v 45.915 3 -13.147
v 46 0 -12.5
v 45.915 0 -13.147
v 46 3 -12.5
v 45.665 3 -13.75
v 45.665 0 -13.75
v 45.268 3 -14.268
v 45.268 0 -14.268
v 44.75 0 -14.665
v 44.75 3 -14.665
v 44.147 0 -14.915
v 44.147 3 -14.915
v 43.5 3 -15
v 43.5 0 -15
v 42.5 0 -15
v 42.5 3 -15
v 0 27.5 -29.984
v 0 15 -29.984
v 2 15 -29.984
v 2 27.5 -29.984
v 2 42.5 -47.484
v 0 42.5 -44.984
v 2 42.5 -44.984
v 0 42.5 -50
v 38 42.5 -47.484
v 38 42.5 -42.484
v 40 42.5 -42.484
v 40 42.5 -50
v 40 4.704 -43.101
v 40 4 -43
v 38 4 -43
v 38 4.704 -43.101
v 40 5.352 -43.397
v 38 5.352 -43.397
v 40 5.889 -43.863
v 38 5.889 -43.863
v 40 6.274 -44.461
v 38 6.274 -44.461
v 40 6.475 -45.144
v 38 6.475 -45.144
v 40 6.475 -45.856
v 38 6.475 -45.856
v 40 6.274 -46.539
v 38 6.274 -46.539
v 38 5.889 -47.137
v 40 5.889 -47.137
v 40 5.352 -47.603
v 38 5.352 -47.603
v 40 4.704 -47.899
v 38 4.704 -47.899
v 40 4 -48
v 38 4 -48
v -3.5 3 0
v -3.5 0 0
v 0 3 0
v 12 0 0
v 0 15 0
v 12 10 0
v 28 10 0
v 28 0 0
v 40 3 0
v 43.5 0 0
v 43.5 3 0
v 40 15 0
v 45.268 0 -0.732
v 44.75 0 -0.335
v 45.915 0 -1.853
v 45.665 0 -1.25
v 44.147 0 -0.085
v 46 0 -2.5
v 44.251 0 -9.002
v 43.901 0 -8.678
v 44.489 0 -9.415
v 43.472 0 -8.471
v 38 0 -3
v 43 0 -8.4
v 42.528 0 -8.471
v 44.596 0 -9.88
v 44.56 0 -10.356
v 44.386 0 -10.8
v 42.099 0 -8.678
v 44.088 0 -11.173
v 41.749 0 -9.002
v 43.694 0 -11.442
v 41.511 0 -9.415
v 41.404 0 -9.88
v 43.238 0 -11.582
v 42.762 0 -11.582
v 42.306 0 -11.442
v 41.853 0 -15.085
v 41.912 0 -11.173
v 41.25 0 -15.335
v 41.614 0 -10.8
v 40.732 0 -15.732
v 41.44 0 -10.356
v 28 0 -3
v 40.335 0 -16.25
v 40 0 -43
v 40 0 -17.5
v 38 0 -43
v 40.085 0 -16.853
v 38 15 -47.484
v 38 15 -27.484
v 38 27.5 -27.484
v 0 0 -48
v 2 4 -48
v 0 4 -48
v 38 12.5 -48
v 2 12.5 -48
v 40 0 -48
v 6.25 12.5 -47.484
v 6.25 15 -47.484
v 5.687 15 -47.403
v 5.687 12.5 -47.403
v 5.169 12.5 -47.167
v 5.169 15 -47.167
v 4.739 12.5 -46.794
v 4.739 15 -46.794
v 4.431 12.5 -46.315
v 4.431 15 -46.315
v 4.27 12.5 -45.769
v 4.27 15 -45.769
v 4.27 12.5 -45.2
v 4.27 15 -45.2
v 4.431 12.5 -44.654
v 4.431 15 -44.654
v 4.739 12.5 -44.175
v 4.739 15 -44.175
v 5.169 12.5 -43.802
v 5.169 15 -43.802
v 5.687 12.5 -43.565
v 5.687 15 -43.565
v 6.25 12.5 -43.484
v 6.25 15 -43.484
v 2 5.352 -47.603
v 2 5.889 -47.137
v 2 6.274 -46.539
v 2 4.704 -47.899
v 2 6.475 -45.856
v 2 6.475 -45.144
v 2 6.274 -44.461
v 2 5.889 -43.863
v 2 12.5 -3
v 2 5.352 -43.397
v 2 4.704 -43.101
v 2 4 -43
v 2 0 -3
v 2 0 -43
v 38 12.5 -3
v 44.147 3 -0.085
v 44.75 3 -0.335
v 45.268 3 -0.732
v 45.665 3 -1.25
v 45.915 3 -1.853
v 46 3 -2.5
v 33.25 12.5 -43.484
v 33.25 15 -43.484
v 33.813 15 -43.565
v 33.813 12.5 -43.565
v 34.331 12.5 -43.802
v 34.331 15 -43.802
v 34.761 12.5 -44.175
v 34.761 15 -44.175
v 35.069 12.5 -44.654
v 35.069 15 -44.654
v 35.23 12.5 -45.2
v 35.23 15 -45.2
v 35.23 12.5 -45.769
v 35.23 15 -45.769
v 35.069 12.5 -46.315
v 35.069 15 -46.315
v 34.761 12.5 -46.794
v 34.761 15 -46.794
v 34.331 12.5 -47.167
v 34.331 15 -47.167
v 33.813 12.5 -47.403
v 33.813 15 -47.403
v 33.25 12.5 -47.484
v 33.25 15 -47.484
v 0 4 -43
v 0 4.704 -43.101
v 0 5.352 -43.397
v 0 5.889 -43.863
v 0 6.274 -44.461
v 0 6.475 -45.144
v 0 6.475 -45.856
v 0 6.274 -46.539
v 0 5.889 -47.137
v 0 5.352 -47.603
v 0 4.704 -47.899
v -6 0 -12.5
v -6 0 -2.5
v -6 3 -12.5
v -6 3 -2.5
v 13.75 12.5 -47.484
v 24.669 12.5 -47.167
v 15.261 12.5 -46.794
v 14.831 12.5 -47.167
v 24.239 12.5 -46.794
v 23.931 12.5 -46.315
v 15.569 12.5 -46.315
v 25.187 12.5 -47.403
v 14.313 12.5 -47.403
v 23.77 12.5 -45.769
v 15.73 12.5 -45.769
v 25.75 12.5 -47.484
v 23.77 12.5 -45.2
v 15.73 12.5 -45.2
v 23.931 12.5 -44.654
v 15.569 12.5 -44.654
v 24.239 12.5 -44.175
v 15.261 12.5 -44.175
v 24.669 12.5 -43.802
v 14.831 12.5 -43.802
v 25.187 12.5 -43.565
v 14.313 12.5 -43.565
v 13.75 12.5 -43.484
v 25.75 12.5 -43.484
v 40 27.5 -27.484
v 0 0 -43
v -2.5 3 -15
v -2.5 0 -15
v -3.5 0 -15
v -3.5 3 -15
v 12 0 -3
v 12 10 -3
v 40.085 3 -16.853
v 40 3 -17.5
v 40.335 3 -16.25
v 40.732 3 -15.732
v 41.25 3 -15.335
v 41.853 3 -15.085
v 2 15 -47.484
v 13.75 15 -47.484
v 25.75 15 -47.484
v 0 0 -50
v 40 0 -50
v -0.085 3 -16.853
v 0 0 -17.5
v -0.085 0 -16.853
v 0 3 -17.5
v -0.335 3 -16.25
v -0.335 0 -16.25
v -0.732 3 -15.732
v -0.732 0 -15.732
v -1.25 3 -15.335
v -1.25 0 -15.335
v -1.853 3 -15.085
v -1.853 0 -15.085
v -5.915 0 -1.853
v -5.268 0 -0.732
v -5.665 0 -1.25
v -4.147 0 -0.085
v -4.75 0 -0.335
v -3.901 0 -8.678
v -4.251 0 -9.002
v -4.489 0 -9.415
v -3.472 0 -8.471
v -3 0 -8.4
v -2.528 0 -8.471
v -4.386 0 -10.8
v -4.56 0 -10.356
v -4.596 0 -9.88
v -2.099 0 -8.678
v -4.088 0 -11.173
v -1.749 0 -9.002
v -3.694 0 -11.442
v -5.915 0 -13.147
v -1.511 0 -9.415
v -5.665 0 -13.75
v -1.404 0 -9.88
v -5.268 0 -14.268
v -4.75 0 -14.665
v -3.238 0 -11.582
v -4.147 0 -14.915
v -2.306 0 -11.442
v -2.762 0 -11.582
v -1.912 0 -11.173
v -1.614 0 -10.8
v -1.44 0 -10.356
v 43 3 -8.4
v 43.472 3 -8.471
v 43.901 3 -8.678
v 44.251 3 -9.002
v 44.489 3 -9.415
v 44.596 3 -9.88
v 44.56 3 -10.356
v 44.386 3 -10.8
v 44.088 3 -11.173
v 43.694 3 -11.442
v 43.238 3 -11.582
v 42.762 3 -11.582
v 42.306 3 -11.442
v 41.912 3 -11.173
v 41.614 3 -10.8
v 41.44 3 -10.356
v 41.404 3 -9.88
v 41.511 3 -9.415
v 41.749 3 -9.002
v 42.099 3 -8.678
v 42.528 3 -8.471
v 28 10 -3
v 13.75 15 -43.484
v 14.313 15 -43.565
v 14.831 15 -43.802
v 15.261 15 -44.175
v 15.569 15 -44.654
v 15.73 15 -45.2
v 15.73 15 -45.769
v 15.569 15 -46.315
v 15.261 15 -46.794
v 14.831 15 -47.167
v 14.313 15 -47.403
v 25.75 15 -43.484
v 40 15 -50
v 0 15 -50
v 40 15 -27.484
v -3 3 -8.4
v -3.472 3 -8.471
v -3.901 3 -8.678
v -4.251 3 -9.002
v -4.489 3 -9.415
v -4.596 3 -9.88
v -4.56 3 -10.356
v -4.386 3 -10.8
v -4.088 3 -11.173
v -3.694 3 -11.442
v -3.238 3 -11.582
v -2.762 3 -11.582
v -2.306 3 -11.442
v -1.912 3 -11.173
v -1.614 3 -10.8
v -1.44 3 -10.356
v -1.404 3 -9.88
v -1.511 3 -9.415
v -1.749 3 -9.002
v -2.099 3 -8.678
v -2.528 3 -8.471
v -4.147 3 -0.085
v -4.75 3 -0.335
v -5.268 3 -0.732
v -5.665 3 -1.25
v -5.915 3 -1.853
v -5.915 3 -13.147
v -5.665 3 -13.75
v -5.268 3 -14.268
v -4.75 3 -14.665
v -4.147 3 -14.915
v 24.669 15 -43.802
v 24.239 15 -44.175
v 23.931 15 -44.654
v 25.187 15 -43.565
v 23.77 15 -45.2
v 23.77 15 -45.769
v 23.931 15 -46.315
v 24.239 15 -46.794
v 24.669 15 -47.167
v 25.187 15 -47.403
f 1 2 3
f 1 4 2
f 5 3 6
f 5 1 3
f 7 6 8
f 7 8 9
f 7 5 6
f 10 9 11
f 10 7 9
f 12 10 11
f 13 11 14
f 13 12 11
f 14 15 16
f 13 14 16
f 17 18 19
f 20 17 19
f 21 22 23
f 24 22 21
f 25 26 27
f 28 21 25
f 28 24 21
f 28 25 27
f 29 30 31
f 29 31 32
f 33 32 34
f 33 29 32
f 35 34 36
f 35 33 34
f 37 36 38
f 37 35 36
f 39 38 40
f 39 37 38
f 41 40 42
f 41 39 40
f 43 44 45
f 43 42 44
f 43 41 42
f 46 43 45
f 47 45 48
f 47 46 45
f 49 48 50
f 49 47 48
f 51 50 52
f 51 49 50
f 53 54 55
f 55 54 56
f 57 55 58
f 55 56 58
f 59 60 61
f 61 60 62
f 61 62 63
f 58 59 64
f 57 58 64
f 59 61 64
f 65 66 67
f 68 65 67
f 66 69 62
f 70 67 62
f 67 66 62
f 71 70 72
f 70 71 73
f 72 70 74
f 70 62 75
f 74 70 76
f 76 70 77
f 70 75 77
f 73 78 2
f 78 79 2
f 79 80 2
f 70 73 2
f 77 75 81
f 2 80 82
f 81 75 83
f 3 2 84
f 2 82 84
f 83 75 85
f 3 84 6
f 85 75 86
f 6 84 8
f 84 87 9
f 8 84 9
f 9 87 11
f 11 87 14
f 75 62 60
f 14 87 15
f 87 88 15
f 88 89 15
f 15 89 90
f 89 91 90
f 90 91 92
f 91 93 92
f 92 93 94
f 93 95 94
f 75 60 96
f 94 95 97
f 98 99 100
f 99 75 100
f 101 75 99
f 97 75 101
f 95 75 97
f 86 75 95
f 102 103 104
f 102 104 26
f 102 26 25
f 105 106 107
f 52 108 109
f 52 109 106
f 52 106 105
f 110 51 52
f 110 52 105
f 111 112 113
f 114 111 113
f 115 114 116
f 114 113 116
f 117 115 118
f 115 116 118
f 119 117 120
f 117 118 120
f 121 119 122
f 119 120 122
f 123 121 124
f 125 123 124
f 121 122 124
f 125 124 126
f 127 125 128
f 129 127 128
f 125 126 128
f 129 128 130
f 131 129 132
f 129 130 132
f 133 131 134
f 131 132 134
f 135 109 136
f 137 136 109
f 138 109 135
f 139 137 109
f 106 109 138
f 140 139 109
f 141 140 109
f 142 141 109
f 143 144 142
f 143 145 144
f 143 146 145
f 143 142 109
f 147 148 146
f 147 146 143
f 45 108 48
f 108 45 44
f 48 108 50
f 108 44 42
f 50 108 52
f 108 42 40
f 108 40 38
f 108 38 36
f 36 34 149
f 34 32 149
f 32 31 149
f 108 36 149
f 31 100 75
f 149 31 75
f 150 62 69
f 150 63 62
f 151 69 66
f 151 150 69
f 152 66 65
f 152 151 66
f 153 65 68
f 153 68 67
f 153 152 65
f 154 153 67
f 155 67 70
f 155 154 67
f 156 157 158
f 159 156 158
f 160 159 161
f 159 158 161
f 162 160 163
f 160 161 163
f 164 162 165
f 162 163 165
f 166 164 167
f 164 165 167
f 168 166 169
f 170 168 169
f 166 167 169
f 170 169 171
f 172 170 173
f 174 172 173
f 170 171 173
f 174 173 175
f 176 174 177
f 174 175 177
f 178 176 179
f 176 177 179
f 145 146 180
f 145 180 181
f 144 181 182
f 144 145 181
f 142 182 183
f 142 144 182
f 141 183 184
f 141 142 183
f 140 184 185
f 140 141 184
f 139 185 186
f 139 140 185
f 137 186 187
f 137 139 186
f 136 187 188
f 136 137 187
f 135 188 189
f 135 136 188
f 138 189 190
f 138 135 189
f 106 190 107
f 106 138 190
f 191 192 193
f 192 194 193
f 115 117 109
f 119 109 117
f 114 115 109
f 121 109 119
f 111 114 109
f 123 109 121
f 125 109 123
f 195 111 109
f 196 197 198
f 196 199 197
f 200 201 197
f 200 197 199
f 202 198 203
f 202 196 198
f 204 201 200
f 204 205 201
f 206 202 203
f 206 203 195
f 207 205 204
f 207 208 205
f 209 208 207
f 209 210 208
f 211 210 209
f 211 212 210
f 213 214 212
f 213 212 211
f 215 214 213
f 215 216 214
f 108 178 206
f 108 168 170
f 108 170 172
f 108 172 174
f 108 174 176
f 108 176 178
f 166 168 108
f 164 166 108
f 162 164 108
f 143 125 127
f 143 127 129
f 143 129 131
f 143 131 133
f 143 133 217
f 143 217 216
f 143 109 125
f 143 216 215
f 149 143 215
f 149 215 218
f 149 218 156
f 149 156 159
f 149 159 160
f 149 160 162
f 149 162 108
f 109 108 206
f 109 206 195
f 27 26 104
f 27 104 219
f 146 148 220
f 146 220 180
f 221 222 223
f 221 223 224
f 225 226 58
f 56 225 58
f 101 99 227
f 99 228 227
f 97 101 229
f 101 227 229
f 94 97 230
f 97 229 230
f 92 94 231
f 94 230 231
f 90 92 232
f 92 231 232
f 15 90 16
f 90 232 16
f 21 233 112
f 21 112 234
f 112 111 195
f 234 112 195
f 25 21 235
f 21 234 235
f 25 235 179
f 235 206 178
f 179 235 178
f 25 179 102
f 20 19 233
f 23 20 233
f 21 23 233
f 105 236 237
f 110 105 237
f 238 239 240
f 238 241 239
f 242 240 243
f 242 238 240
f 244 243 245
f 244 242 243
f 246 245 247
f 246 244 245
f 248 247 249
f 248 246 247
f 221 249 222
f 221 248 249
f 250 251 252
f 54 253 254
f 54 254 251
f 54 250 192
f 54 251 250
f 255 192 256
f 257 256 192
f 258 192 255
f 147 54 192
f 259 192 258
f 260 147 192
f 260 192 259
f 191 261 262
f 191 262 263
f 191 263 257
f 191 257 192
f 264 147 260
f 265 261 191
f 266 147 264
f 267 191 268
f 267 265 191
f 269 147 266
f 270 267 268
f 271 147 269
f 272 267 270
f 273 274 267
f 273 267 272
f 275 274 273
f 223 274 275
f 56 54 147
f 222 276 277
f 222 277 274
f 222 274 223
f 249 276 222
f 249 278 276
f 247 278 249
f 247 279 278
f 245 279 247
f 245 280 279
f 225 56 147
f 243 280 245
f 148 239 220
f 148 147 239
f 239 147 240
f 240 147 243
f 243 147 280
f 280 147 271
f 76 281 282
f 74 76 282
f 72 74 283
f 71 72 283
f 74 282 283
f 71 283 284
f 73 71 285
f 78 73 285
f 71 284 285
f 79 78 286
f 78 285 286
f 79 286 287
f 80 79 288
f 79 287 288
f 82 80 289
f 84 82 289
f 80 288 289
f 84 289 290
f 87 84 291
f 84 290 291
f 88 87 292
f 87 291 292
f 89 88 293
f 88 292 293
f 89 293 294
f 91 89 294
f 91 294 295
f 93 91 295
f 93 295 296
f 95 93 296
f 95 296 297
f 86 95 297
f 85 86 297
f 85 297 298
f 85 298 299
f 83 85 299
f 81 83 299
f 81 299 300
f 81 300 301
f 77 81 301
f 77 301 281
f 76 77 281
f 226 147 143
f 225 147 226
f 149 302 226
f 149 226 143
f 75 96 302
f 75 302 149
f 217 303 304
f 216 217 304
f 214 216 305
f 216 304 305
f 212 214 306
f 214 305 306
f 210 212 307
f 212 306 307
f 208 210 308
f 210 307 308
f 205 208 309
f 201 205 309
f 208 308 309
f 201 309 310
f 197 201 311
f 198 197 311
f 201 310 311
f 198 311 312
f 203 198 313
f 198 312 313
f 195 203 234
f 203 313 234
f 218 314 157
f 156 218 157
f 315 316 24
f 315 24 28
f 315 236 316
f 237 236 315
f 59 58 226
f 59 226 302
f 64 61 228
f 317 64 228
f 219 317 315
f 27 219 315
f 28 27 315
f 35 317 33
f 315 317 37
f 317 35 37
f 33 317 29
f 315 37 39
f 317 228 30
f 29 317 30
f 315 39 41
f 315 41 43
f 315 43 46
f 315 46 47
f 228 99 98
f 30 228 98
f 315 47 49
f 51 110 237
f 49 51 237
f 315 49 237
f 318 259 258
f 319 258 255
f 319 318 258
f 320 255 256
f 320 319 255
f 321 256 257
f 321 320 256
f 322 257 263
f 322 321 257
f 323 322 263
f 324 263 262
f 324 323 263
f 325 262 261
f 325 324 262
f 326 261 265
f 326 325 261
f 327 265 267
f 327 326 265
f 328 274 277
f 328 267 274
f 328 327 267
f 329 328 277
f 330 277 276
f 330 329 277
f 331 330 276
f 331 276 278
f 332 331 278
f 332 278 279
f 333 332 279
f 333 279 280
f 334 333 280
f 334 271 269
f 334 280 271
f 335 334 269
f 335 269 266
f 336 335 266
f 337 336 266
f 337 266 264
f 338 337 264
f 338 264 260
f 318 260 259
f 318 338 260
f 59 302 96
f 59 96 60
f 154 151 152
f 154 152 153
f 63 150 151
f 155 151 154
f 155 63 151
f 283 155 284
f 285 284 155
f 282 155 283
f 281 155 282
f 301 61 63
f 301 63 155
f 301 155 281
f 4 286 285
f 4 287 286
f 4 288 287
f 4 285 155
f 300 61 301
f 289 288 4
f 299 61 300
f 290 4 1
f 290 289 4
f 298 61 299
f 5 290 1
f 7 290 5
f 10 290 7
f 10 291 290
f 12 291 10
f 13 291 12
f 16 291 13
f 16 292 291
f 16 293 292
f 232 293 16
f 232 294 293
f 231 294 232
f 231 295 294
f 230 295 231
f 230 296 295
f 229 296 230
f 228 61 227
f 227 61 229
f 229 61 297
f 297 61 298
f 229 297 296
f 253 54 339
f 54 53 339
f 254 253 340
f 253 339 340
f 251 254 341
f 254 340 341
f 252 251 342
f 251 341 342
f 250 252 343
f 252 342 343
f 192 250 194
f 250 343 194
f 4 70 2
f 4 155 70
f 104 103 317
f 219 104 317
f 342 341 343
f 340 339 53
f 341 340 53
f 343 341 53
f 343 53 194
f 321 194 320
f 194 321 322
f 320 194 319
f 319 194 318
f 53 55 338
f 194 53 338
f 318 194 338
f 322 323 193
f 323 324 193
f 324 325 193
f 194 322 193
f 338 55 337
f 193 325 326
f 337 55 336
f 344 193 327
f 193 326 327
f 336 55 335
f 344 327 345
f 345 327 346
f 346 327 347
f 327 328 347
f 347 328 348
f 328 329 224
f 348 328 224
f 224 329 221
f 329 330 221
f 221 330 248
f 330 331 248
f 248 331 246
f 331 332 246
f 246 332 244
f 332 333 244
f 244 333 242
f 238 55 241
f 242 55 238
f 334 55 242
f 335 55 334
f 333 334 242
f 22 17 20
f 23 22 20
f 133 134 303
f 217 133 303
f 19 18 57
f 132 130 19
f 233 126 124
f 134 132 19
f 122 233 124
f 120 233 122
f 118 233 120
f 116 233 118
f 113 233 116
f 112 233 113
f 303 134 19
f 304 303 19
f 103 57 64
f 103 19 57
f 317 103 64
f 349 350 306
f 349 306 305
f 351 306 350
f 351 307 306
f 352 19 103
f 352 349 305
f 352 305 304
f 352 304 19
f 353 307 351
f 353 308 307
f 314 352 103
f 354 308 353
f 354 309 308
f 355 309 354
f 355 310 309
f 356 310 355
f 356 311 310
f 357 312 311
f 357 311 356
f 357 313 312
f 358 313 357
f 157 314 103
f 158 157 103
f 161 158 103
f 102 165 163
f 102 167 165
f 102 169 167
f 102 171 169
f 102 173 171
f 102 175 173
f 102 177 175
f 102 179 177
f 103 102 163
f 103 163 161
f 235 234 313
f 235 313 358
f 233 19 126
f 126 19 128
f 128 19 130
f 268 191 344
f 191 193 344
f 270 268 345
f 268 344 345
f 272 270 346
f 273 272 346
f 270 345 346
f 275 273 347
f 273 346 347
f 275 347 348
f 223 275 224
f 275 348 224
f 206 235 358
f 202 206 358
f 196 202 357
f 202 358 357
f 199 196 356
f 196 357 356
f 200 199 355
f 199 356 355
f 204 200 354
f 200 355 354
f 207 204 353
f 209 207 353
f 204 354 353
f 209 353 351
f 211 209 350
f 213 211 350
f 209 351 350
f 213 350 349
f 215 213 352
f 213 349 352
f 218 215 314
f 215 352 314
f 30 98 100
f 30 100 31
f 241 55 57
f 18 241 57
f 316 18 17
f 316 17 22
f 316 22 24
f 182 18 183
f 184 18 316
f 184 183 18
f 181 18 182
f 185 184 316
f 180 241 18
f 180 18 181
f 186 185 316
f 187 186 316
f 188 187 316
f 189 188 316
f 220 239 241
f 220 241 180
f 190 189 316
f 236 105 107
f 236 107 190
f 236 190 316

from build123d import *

# Parameters (mm, degrees)
SKETCH1_W               = 40
SKETCH1_H               = 50
BOSS_EXTRUDE1_DEPTH     = 15
SKETCH2_W               = 16
SKETCH2_H               = 3
CUT_EXTRUDE1_DEPTH      = 10
SKETCH3_W               = 36
SKETCH3_H               = 45
CUT_EXTRUDE2_DEPTH      = 12.5
SKETCH4_W               = 40
SKETCH4_H               = 2.515653855
BOSS_EXTRUDE2_DEPTH     = 27.5
CUT_EXTRUDE3_DEPTH      = 70.686799324
SKETCH6_W               = 2
SKETCH6_H               = 17.5
SKETCH6_H_2             = 20
BOSS_EXTRUDE3_DEPTH     = 27.5
CUT_EXTRUDE5_DEPTH      = 77.852130745
CUT_EXTRUDE5_DEPTH_BACK = 77.852130745
SKETCH8_W               = 15
SKETCH8_H               = 3
BOSS_EXTRUDE4_DEPTH     = 6
SKETCH9_R               = 1.6
CUT_EXTRUDE6_DEPTH      = 79.589121385
FILLET1_R               = 2.5
CHAMFER3_SIZE           = 15


with BuildPart() as part:
    # Sketch1 → Boss-Extrude1 (new body)
    with BuildSketch(Plane(origin=(0, 0, 0), x_dir=(1, 0, 0), z_dir=(0, 1, 0))):
        with Locations((20, 25)):
            Rectangle(SKETCH1_W, SKETCH1_H)
    extrude(amount=BOSS_EXTRUDE1_DEPTH)

    # Sketch2 → Cut-Extrude1 (cut)
    with BuildSketch(Plane.XZ):
        with Locations((20, -1.5)):
            Rectangle(SKETCH2_W, SKETCH2_H)
    extrude(amount=-CUT_EXTRUDE1_DEPTH, mode=Mode.SUBTRACT)

    # Sketch3 → Cut-Extrude2 (cut)
    with BuildSketch(Plane.XZ):
        with Locations((20, -25.5)):
            Rectangle(SKETCH3_W, SKETCH3_H)
    extrude(amount=-CUT_EXTRUDE2_DEPTH, mode=Mode.SUBTRACT)

    # Sketch4 → Boss-Extrude2 (add)
    with BuildSketch(Plane(origin=(0, 15, 0), x_dir=(1, 0, 0), z_dir=(0, 1, 0))):
        with Locations((20, 48.742173073)):
            Rectangle(SKETCH4_W, SKETCH4_H)
    extrude(amount=BOSS_EXTRUDE2_DEPTH)

    # Sketch5 → Cut-Extrude3 (cut, through all)
    with BuildSketch(Plane(origin=(0, 15, 0), x_dir=(1, 0, 0), z_dir=(0, 1, 0))):
        with BuildLine():
            Line((13.75, 47.484346145), (6.25, 47.484346145))
            ThreePointArc((6.25, 47.484346145), (4.25, 45.484346145), (6.25, 43.484346145))
            Line((6.25, 43.484346145), (13.75, 43.484346145))
            ThreePointArc((13.75, 43.484346145), (15.75, 45.484346145), (13.75, 47.484346145))
        make_face()
        with BuildLine():
            Line((33.25, 47.484346145), (25.75, 47.484346145))
            ThreePointArc((25.75, 47.484346145), (23.75, 45.484346145), (25.75, 43.484346145))
            Line((25.75, 43.484346145), (33.25, 43.484346145))
            ThreePointArc((33.25, 43.484346145), (35.25, 45.484346145), (33.25, 47.484346145))
        make_face()
    extrude(amount=-CUT_EXTRUDE3_DEPTH, mode=Mode.SUBTRACT)

    # Sketch6 → Boss-Extrude3 (add)
    with BuildSketch(Plane(origin=(0, 15, 0), x_dir=(1, 0, 0), z_dir=(0, 1, 0))):
        with Locations((1, 38.734346145)):
            Rectangle(SKETCH6_W, SKETCH6_H)
        with Locations((39, 37.484346145)):
            Rectangle(SKETCH6_W, SKETCH6_H_2)
    extrude(amount=BOSS_EXTRUDE3_DEPTH)

    # Sketch7 → Cut-Extrude5 (cut, two sides: drawn at the far end of the back side and taken through both)
    with BuildSketch(Plane.ZY.offset(-CUT_EXTRUDE5_DEPTH_BACK)):
        with BuildLine():
            Line((-48, 4), (-48, 0))
            Line((-48, 0), (-43, 0))
            Line((-43, 0), (-43, 4))
            ThreePointArc((-43, 4), (-45.5, 6.5), (-48, 4))
        make_face()
    extrude(amount=CUT_EXTRUDE5_DEPTH + CUT_EXTRUDE5_DEPTH_BACK, mode=Mode.SUBTRACT)

    # Sketch8 → Boss-Extrude4 (add)
    with BuildSketch(Plane(origin=(40, 0, 0), x_dir=(0, 0, -1), z_dir=(1, 0, 0))):
        with Locations((7.5, 1.5)):
            Rectangle(SKETCH8_W, SKETCH8_H)
    boss_extrude4 = extrude(amount=BOSS_EXTRUDE4_DEPTH)

    # Sketch9 → Cut-Extrude6 (cut, through all)
    with BuildSketch(Plane(origin=(0, 3, 0), x_dir=(1, 0, 0), z_dir=(0, 1, 0))):
        with Locations(Location((43, 10, 0), (0, 0, 270))):
            Circle(SKETCH9_R)
    cut_extrude6 = extrude(amount=-CUT_EXTRUDE6_DEPTH, mode=Mode.SUBTRACT)

    # Mirror1: Boss-Extrude4, Cut-Extrude6 across plane
    add(boss_extrude4.mirror(Plane.ZY.offset(-20)))
    add(cut_extrude6.mirror(Plane.ZY.offset(-20)), mode=Mode.SUBTRACT)

    # Fillet1
    fillet1_edges = [part.edges().sort_by_distance(p)[0] for p in [
        (40, 1.5, -15),
        (46, 1.5, 0),
        (46, 1.5, -15),
        (-6, 1.5, 0),
        (-6, 1.5, -15),
        (0, 1.5, -15),
    ]]
    fillet(fillet1_edges, radius=FILLET1_R)

    # Chamfer3
    chamfer3_edges = [part.edges().sort_by_distance(p)[0] for p in [
        (39, 42.5, -27.484346145),
        (1, 42.5, -29.984346145),
    ]]
    chamfer(chamfer3_edges, length=CHAMFER3_SIZE)


solid = part.part
